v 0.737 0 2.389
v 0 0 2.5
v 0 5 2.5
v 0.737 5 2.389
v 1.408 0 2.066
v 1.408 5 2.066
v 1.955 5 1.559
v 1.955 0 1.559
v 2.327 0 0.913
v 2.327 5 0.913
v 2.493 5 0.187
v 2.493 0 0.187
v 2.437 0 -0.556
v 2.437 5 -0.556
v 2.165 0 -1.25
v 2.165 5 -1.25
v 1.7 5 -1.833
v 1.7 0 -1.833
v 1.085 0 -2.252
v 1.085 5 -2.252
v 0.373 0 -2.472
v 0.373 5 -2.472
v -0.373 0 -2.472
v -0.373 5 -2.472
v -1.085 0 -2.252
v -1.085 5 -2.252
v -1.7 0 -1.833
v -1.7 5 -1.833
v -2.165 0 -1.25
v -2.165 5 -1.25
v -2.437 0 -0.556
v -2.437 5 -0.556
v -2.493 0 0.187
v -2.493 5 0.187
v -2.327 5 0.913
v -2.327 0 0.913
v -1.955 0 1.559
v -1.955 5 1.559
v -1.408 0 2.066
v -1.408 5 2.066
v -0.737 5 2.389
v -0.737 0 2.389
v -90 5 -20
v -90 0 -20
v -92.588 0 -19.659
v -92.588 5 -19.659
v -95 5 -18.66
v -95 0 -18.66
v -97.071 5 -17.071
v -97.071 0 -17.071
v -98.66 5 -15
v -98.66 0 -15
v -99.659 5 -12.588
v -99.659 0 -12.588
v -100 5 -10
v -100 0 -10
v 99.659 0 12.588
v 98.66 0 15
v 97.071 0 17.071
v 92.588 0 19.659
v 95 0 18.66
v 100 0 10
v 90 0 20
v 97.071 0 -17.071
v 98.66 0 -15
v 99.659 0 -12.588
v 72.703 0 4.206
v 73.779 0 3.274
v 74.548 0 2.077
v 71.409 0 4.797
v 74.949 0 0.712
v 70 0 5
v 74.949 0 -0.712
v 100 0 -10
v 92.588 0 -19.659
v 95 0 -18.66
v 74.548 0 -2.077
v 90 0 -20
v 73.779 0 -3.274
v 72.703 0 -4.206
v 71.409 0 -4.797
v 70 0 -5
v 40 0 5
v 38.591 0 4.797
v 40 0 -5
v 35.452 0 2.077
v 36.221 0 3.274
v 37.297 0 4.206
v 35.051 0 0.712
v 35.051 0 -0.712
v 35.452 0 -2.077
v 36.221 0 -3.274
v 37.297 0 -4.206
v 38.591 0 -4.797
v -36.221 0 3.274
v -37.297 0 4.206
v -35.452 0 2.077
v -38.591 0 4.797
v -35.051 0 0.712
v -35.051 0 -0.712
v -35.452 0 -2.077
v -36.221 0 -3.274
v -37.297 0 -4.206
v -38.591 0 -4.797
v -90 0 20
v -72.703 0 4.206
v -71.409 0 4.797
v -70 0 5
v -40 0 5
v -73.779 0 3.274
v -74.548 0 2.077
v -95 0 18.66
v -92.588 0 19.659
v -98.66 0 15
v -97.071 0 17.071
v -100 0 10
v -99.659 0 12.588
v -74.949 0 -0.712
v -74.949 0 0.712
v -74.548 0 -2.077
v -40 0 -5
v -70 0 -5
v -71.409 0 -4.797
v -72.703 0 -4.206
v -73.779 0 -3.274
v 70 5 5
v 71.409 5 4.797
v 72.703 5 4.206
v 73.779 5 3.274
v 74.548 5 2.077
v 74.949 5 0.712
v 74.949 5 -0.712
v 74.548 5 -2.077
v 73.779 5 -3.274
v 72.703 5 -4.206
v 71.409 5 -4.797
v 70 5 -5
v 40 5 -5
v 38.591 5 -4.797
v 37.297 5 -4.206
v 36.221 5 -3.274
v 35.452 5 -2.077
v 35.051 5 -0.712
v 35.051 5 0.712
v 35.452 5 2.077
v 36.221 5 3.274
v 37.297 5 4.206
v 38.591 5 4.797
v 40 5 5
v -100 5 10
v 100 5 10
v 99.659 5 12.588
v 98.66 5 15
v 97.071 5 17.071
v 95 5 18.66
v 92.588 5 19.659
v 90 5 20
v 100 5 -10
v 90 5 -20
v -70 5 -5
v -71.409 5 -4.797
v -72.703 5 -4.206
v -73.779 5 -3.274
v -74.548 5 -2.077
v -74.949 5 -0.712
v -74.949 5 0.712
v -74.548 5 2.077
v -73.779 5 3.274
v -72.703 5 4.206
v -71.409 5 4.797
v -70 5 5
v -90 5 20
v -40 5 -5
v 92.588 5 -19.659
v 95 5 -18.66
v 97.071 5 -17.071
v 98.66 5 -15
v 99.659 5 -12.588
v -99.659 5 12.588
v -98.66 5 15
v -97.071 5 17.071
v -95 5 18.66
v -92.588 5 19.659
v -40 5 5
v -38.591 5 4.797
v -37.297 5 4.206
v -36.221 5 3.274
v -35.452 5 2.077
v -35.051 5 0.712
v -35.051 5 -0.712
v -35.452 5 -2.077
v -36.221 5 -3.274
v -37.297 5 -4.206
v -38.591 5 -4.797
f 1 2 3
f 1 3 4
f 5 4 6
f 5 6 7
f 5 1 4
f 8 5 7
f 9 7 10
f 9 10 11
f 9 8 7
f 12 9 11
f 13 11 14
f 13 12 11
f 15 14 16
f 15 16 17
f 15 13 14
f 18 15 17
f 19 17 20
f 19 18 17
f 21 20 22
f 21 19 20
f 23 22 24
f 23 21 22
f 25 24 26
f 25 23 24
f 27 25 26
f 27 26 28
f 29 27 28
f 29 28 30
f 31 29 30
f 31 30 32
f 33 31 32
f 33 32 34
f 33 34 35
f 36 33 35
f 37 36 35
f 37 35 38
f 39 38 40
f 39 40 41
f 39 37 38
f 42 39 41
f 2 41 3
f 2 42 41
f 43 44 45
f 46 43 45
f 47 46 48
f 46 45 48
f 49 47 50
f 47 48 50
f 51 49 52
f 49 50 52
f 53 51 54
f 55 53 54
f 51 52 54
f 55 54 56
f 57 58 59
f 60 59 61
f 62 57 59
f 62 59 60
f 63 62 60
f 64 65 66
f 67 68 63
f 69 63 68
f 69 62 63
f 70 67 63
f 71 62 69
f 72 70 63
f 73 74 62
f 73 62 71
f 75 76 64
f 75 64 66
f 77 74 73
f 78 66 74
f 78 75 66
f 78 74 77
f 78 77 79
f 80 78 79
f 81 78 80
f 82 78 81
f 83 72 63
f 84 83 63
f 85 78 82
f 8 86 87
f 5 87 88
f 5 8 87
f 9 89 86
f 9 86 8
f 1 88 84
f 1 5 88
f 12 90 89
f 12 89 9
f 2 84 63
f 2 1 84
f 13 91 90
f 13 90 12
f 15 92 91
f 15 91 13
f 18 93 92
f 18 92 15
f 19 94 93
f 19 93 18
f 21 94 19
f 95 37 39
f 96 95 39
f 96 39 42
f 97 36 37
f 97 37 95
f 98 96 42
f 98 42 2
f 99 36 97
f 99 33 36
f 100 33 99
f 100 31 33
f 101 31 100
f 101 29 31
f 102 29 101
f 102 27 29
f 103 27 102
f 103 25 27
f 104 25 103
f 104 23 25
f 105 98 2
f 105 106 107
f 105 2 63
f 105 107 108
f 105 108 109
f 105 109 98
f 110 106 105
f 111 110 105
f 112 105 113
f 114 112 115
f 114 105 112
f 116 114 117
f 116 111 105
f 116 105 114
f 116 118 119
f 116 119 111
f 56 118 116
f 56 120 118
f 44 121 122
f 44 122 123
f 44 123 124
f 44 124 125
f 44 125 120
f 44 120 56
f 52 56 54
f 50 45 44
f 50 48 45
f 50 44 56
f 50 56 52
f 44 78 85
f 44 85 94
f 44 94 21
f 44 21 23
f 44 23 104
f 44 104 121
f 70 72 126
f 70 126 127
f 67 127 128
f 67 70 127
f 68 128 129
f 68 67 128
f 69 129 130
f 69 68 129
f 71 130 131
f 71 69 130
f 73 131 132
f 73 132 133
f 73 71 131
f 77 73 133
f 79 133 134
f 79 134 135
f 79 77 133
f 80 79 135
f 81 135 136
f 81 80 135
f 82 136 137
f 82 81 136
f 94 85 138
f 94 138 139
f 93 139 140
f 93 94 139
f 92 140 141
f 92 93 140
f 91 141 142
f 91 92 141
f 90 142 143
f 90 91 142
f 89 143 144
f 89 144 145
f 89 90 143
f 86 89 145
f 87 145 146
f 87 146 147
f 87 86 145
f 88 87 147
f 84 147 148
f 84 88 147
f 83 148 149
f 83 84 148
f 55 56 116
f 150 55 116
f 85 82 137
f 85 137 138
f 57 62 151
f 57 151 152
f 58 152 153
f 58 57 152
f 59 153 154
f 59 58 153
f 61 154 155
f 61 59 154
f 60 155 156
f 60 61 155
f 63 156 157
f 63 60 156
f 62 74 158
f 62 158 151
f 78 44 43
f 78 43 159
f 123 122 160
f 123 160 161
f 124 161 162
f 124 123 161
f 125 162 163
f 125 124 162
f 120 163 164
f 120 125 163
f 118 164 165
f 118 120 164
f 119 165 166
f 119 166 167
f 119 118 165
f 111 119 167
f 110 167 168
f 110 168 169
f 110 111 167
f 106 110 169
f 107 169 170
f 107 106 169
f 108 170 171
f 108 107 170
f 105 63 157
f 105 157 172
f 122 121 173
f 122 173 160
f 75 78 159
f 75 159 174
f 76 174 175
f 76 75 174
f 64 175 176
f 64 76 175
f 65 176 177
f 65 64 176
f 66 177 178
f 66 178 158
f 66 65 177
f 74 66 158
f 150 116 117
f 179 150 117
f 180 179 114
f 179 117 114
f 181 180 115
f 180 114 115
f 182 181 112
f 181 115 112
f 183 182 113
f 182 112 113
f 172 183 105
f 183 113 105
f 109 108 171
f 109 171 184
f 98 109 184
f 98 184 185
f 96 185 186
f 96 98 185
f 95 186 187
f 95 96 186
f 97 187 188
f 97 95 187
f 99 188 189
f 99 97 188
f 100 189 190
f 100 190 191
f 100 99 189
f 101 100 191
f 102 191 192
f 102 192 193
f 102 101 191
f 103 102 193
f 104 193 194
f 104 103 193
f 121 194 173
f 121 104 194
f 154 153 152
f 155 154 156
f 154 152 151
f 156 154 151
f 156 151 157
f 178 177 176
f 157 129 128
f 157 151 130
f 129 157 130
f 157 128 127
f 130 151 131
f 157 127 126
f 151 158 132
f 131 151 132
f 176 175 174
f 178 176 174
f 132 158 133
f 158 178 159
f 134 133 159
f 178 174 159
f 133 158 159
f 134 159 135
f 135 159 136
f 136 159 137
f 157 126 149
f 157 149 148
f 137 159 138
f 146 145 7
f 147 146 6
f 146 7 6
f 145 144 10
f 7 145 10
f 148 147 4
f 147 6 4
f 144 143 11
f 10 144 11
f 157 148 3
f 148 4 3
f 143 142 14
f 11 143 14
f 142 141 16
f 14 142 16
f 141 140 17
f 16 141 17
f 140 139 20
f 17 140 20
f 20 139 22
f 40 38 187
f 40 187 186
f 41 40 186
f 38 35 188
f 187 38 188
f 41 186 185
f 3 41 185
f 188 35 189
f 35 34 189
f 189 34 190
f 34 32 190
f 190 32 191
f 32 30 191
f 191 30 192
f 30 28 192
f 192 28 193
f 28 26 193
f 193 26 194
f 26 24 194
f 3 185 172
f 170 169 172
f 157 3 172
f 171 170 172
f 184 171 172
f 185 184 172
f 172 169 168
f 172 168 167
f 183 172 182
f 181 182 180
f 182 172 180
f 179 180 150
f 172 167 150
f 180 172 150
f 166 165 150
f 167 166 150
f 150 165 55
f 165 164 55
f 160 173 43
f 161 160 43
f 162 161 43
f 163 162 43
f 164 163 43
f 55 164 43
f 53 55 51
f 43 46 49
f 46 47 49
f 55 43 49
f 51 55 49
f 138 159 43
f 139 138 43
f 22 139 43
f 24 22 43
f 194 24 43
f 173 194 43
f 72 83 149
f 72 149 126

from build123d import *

# Parameters (mm, degrees)
SKETCH_1_W      = 40
SKETCH_1_H      = 40
SKETCH_1_R      = 2.5
EXTRUDE_3_DEPTH = 5


with BuildPart() as part:
    # 草图1 → 凸台-拉伸3 (new body)
    # profile 1 of 3: a face of its own
    with BuildSketch(Plane(origin=(0, 0, 0), x_dir=(1, 0, 0), z_dir=(0, 1, 0))):
        with BuildLine():
            Line((-100, 10), (-100, -10))
            ThreePointArc((-100, -10), (-97.071067812, -17.071067812), (-90, -20))
            Line((-90, -20), (-20, -20))
            Line((-20, -20), (-20, 20))
            Line((-20, 20), (-90, 20))
            ThreePointArc((-90, 20), (-97.071067812, 17.071067812), (-100, 10))
        make_face()
        with BuildLine():
            ThreePointArc((-70, 5), (-75, 0), (-70, -5))
            Line((-70, -5), (-40, -5))
            ThreePointArc((-40, -5), (-35, 0), (-40, 5))
            Line((-40, 5), (-70, 5))
        make_face(mode=Mode.SUBTRACT)
    # profile 2 of 3: a face of its own
    with BuildSketch(Plane(origin=(0, 0, 0), x_dir=(1, 0, 0), z_dir=(0, 1, 0))):
        Rectangle(SKETCH_1_W, SKETCH_1_H)
        with Locations(Location((0, 0, 0), (0, 0, 270))):
            Circle(SKETCH_1_R, mode=Mode.SUBTRACT)
    # profile 3 of 3: a face of its own
    with BuildSketch(Plane(origin=(0, 0, 0), x_dir=(1, 0, 0), z_dir=(0, 1, 0))):
        with BuildLine():
            ThreePointArc((90, 20), (97.071067812, 17.071067812), (100, 10))
            Line((100, 10), (100, -10))
            ThreePointArc((100, -10), (97.071067812, -17.071067812), (90, -20))
            Line((90, -20), (20, -20))
            Line((20, -20), (20, 20))
            Line((20, 20), (90, 20))
        make_face()
        with BuildLine():
            ThreePointArc((70, -5), (75, 0), (70, 5))
            Line((70, 5), (40, 5))
            ThreePointArc((40, 5), (35, 0), (40, -5))
            Line((40, -5), (70, -5))
        make_face(mode=Mode.SUBTRACT)
    extrude(amount=EXTRUDE_3_DEPTH)


solid = part.part
